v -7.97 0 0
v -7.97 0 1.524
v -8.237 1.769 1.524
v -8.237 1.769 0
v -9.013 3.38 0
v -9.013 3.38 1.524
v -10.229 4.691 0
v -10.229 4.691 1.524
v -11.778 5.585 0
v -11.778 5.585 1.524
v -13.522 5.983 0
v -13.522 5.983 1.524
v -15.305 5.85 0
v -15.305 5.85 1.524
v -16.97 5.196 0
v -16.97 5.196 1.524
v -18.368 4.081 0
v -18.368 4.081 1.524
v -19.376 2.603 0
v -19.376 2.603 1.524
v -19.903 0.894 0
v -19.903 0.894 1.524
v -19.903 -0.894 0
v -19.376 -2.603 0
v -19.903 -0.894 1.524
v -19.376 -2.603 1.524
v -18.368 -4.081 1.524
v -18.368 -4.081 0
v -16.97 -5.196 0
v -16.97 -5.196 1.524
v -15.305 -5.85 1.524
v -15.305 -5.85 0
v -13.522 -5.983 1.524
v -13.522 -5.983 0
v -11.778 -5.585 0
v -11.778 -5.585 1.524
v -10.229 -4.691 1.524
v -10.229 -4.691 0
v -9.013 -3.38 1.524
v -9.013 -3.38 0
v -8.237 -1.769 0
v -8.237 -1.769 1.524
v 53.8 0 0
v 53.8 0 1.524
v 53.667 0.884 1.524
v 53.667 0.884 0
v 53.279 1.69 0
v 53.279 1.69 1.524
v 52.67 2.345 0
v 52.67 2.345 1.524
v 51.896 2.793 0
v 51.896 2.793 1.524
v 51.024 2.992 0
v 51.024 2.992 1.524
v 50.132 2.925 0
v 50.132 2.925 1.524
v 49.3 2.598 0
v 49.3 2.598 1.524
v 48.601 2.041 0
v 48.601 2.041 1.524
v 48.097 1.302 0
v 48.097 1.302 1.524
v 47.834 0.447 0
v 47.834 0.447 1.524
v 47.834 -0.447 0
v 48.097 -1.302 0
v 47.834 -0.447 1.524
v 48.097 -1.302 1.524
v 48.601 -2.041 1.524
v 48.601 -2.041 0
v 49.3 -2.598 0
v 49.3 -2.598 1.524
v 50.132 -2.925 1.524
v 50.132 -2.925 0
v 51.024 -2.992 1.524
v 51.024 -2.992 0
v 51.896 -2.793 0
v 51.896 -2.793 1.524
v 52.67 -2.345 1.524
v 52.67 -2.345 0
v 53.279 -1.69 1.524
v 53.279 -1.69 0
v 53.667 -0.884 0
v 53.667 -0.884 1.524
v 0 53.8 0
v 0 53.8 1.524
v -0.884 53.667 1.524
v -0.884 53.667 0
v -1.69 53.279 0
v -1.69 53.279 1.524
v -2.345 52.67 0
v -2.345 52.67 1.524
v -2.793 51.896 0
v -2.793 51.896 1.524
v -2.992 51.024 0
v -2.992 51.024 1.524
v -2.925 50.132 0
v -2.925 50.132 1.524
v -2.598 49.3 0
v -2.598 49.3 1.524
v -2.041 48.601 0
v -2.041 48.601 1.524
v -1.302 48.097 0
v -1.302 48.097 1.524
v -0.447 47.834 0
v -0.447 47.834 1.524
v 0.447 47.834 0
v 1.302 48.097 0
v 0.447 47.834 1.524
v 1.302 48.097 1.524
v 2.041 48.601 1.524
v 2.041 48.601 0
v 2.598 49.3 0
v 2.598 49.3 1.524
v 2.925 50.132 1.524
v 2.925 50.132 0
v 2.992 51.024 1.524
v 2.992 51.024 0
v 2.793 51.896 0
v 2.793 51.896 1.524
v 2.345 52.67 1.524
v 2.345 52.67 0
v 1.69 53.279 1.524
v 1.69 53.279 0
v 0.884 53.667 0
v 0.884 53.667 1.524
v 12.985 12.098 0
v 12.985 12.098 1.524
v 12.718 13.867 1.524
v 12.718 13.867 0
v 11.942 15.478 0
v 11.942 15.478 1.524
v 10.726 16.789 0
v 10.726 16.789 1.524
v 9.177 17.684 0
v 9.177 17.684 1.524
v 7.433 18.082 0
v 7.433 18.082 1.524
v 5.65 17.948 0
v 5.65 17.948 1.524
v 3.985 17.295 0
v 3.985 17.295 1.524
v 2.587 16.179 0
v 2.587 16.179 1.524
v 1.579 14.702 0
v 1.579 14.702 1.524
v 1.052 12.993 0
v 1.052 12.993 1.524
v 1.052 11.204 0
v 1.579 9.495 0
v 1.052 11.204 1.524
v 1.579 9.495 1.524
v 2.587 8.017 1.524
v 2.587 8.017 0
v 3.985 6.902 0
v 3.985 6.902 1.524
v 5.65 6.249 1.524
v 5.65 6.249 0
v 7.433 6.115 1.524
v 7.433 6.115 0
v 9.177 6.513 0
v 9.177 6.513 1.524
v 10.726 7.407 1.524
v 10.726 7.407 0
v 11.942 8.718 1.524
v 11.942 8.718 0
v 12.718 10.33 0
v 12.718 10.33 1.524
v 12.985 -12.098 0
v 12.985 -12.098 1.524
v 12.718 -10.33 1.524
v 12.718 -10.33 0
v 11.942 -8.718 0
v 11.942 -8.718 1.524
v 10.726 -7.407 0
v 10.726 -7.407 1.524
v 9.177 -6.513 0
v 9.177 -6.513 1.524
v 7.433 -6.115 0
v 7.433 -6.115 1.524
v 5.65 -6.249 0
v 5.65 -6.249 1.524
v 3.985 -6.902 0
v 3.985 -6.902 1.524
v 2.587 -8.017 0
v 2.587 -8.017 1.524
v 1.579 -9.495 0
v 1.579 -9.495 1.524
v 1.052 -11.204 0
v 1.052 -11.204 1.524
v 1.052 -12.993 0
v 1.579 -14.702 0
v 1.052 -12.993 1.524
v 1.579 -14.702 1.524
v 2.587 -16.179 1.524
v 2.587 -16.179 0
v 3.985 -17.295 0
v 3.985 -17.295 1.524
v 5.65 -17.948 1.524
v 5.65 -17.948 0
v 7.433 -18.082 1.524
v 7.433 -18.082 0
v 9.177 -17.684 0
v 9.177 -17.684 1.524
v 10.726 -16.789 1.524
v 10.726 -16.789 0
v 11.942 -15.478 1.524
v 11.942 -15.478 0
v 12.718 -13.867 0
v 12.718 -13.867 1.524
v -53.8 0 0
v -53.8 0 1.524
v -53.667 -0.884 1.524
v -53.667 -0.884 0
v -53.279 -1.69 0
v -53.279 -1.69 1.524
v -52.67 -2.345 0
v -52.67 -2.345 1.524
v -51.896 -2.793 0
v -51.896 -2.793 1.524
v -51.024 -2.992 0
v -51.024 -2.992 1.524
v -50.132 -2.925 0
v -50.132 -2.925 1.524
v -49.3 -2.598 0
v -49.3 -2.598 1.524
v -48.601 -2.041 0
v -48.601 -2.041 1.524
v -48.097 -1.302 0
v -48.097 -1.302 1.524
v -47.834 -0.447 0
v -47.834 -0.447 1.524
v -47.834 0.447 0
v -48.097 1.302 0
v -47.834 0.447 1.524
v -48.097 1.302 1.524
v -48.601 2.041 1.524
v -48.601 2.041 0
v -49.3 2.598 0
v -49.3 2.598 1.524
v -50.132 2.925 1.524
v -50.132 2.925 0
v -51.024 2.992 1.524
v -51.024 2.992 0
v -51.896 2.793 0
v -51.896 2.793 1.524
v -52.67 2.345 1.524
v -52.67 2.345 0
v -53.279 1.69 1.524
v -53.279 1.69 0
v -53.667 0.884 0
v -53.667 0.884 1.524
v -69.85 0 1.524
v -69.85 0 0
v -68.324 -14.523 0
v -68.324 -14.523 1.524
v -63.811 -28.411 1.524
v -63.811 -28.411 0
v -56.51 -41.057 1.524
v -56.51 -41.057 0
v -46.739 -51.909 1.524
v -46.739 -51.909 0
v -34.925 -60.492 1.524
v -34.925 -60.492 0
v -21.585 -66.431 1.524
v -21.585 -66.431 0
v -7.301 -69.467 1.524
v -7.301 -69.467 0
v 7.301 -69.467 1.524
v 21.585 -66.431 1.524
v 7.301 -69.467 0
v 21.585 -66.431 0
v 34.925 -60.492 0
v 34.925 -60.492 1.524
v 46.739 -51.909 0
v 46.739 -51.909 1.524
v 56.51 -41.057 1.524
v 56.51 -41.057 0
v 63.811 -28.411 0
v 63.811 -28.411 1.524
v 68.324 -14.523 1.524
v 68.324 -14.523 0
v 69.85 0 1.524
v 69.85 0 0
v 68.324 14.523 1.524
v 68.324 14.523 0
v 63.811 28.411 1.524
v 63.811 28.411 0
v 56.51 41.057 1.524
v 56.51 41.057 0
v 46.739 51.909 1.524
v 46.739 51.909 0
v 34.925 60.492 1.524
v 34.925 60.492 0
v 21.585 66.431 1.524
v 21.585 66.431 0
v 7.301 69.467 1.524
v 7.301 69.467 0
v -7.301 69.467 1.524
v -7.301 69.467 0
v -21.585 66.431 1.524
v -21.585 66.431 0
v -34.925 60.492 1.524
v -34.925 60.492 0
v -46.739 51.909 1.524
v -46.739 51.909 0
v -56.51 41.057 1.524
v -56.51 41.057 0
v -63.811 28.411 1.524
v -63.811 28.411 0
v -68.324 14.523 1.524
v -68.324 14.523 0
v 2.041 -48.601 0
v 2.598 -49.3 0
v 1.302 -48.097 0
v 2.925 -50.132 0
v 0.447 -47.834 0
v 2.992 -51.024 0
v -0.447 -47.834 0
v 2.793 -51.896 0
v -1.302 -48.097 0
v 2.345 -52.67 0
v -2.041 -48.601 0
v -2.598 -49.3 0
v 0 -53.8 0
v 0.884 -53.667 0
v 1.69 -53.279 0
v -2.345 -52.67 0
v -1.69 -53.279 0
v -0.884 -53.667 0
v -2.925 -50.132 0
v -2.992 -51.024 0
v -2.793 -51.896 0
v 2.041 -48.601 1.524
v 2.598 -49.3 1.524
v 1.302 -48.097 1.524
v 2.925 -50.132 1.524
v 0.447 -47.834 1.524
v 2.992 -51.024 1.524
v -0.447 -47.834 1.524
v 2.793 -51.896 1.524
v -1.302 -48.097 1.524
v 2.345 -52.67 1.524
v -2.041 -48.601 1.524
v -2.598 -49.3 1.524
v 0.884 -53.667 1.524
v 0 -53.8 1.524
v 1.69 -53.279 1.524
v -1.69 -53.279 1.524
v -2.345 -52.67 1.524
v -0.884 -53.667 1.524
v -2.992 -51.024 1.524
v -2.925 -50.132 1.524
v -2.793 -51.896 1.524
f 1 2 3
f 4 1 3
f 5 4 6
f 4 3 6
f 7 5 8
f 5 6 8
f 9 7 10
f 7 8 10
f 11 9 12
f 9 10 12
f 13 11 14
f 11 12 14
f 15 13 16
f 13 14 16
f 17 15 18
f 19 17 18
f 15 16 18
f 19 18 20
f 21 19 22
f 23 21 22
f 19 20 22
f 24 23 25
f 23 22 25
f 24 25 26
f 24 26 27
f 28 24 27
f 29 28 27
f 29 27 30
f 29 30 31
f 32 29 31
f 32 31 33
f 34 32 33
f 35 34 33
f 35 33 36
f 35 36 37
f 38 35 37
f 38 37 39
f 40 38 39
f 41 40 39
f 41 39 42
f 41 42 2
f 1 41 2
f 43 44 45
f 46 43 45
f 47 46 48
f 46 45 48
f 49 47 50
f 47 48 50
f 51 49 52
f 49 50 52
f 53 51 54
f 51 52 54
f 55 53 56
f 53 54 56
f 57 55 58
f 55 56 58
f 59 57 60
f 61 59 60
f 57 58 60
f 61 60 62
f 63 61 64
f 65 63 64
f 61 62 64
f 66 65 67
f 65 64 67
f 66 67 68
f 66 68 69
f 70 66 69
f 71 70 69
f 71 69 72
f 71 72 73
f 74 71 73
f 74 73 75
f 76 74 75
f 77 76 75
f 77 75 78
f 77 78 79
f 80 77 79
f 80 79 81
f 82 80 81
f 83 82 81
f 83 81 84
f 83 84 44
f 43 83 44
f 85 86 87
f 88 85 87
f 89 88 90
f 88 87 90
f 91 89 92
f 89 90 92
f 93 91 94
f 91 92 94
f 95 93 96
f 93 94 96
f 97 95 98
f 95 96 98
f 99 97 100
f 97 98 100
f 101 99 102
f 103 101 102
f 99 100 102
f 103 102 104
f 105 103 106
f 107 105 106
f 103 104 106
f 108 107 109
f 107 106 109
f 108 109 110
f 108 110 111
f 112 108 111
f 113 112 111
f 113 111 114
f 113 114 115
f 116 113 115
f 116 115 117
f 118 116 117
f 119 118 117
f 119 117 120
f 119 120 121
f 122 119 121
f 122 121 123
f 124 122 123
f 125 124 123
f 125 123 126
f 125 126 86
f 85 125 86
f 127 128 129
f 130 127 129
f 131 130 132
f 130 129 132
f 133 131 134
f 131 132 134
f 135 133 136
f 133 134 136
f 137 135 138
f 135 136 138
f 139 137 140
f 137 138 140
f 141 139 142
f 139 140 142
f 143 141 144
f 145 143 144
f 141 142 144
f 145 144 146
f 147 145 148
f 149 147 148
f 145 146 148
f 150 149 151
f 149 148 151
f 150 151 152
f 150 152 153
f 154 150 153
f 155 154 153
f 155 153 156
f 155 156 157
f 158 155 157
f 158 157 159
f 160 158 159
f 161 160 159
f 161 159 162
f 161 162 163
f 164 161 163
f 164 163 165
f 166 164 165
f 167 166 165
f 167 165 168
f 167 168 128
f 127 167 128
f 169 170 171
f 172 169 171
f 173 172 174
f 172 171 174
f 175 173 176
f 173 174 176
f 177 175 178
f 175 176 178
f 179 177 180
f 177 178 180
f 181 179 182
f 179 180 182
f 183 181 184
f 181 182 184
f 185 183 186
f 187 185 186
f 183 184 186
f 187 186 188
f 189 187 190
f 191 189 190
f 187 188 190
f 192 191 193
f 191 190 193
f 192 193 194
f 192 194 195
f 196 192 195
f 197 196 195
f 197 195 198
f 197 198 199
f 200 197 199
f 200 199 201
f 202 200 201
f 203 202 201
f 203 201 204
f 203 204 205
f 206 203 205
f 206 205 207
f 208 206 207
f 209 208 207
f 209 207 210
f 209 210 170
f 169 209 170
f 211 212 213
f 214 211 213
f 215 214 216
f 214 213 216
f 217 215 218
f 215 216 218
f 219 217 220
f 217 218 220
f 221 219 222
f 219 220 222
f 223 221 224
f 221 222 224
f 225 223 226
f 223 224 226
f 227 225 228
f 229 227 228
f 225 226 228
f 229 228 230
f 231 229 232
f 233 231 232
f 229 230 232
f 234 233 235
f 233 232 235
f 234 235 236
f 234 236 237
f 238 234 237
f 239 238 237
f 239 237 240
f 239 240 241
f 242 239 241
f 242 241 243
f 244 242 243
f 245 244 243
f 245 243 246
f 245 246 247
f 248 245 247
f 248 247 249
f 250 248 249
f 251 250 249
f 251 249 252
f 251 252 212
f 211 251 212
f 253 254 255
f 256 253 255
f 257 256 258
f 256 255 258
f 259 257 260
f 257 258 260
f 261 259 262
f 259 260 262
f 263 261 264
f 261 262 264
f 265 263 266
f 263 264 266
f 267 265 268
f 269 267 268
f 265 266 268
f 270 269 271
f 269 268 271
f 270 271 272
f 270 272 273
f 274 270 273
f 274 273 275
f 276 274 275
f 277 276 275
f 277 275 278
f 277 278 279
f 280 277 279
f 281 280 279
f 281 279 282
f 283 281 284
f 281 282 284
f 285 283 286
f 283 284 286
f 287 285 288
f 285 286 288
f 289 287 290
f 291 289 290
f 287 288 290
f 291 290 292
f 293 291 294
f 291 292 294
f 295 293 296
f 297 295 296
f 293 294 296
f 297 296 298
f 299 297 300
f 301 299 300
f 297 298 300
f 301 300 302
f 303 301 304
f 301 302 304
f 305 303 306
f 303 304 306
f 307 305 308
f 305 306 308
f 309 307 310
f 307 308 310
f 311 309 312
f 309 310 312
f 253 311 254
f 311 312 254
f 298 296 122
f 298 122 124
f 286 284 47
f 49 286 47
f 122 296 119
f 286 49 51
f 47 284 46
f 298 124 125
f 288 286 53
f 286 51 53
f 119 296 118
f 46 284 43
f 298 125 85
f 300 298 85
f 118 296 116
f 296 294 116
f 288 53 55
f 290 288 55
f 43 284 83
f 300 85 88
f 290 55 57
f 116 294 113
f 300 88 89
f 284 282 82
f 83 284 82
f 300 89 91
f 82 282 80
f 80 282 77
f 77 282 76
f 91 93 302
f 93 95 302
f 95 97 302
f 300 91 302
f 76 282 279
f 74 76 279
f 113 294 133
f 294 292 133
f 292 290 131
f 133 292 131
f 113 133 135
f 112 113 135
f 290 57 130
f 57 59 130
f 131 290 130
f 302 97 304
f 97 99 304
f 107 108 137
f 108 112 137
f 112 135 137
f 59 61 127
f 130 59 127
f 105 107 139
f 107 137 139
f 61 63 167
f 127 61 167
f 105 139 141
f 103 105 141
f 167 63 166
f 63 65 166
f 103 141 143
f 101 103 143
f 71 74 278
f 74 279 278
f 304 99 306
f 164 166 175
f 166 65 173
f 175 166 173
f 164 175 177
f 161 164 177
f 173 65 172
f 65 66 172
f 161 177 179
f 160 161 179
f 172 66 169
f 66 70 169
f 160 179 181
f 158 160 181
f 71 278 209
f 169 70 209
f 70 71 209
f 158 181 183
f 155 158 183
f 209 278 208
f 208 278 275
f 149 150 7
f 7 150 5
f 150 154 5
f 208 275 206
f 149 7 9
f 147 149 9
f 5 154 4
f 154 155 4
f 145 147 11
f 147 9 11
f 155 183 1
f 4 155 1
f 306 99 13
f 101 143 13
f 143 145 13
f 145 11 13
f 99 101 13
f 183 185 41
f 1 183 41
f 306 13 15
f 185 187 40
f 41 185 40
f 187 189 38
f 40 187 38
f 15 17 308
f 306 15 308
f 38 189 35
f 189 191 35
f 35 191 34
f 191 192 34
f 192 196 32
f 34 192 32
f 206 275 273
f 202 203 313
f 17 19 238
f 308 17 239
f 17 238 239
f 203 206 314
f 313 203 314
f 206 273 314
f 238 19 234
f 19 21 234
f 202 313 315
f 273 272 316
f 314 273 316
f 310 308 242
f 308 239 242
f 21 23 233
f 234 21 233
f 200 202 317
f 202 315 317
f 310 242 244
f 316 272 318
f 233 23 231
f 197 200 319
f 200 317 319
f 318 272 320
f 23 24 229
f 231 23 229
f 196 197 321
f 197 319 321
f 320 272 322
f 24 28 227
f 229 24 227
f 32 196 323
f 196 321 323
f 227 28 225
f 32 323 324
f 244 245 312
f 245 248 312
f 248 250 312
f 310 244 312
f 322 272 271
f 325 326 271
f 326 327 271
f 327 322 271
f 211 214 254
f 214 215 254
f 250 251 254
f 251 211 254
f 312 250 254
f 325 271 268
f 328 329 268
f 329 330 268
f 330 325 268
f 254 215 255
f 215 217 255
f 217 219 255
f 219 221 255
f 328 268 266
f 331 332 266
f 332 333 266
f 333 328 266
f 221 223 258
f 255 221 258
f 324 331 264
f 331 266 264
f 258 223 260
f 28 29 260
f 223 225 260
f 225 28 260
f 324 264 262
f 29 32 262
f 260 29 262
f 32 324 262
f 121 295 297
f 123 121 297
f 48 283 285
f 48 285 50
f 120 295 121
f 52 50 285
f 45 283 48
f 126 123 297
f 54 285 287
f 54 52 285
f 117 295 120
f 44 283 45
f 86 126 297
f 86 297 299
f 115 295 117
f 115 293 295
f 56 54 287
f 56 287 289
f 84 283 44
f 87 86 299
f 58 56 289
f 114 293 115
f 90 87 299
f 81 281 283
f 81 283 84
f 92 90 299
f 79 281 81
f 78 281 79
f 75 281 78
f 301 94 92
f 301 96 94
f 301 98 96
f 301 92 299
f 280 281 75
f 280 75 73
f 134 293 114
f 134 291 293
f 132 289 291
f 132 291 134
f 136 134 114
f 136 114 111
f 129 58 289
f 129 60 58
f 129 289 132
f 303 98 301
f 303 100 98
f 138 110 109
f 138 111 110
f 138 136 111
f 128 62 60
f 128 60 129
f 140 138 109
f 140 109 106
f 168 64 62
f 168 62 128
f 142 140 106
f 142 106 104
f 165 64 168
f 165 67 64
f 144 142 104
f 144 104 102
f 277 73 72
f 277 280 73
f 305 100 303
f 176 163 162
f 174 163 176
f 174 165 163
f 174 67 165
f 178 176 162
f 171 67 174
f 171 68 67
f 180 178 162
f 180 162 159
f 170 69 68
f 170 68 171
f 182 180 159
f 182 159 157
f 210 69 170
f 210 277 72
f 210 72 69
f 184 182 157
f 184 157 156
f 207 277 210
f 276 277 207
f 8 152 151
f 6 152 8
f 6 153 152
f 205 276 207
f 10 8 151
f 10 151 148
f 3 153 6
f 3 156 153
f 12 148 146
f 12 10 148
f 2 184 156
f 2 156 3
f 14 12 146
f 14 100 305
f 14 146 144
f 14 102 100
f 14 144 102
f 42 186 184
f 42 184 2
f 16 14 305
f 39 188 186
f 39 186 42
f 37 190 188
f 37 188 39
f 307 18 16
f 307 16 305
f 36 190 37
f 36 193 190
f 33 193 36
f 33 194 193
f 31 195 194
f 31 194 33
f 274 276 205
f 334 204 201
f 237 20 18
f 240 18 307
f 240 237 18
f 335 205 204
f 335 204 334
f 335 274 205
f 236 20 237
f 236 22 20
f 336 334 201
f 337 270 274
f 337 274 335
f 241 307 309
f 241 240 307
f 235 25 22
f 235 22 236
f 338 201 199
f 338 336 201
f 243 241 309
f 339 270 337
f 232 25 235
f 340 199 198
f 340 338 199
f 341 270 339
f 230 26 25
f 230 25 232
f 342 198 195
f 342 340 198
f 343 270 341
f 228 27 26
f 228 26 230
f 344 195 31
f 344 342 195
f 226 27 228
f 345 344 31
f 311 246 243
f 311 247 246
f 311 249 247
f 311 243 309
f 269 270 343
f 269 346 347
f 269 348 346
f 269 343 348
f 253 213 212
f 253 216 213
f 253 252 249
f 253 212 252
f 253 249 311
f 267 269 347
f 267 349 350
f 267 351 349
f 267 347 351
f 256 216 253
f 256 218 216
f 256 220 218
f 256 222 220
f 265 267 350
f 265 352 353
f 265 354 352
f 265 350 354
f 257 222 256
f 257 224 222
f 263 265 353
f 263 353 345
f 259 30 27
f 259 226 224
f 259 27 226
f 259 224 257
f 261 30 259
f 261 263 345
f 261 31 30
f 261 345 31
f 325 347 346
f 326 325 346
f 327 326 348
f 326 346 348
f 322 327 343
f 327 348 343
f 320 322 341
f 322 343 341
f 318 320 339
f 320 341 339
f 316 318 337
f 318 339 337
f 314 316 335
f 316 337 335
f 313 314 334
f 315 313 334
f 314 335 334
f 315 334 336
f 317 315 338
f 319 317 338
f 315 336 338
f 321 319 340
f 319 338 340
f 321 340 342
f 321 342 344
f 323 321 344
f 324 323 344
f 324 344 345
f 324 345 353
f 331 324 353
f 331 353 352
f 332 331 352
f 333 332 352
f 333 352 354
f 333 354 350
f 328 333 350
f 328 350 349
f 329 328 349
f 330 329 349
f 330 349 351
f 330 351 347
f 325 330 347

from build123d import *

# Parameters (mm, degrees)
SKETCH1_R           = 69.85
BOSS_EXTRUDE1_DEPTH = 1.524
SKETCH2_R           = 6
CUT_EXTRUDE1_DEPTH  = 2
CUT_EXTRUDE2_REACH  = 100.795
SKETCH3_R           = 3
CIRPATTERN1_COUNT   = 4


with BuildPart() as part:
    # Sketch1 → Boss-Extrude1 (new body)
    with BuildSketch(Plane.XY):
        with Locations(Location((0, 0, 0), (0, 0, 180))):
            Circle(SKETCH1_R)
    extrude(amount=BOSS_EXTRUDE1_DEPTH)

    # Sketch2 → Cut-Extrude1 (cut)
    with BuildSketch(Plane.XY.offset(1.524)):
        with Locations((-13.97, 0)):
            Circle(SKETCH2_R)
        with Locations((6.985, 12.098374891)):
            Circle(SKETCH2_R)
        with Locations((6.985, -12.098374891)):
            Circle(SKETCH2_R)
    extrude(amount=-CUT_EXTRUDE1_DEPTH, mode=Mode.SUBTRACT)

    # Sketch3 → Cut-Extrude2 (cut, up to next)
    with BuildSketch(Plane.XY.offset(1.524), mode=Mode.PRIVATE) as cut_extrude2_sk1:
        with Locations((50.8, 0)):
            Circle(SKETCH3_R)
    cut_extrude2_tool1 = extrude(cut_extrude2_sk1.sketch, amount=-CUT_EXTRUDE2_REACH, mode=Mode.PRIVATE) & part.part
    cut_extrude2 = cut_extrude2_tool1.solids().sort_by_distance((50.8, 0, 1.524))[0]
    add(cut_extrude2, mode=Mode.SUBTRACT)

    # CirPattern1: Cut-Extrude2 ×4 about axis
    cirpattern1_axis = Axis((0, 0, 0), (0, 0, 1))
    for i in range(1, CIRPATTERN1_COUNT):
        add(cut_extrude2.rotate(cirpattern1_axis, i * 360 / CIRPATTERN1_COUNT), mode=Mode.SUBTRACT)


solid = part.part
